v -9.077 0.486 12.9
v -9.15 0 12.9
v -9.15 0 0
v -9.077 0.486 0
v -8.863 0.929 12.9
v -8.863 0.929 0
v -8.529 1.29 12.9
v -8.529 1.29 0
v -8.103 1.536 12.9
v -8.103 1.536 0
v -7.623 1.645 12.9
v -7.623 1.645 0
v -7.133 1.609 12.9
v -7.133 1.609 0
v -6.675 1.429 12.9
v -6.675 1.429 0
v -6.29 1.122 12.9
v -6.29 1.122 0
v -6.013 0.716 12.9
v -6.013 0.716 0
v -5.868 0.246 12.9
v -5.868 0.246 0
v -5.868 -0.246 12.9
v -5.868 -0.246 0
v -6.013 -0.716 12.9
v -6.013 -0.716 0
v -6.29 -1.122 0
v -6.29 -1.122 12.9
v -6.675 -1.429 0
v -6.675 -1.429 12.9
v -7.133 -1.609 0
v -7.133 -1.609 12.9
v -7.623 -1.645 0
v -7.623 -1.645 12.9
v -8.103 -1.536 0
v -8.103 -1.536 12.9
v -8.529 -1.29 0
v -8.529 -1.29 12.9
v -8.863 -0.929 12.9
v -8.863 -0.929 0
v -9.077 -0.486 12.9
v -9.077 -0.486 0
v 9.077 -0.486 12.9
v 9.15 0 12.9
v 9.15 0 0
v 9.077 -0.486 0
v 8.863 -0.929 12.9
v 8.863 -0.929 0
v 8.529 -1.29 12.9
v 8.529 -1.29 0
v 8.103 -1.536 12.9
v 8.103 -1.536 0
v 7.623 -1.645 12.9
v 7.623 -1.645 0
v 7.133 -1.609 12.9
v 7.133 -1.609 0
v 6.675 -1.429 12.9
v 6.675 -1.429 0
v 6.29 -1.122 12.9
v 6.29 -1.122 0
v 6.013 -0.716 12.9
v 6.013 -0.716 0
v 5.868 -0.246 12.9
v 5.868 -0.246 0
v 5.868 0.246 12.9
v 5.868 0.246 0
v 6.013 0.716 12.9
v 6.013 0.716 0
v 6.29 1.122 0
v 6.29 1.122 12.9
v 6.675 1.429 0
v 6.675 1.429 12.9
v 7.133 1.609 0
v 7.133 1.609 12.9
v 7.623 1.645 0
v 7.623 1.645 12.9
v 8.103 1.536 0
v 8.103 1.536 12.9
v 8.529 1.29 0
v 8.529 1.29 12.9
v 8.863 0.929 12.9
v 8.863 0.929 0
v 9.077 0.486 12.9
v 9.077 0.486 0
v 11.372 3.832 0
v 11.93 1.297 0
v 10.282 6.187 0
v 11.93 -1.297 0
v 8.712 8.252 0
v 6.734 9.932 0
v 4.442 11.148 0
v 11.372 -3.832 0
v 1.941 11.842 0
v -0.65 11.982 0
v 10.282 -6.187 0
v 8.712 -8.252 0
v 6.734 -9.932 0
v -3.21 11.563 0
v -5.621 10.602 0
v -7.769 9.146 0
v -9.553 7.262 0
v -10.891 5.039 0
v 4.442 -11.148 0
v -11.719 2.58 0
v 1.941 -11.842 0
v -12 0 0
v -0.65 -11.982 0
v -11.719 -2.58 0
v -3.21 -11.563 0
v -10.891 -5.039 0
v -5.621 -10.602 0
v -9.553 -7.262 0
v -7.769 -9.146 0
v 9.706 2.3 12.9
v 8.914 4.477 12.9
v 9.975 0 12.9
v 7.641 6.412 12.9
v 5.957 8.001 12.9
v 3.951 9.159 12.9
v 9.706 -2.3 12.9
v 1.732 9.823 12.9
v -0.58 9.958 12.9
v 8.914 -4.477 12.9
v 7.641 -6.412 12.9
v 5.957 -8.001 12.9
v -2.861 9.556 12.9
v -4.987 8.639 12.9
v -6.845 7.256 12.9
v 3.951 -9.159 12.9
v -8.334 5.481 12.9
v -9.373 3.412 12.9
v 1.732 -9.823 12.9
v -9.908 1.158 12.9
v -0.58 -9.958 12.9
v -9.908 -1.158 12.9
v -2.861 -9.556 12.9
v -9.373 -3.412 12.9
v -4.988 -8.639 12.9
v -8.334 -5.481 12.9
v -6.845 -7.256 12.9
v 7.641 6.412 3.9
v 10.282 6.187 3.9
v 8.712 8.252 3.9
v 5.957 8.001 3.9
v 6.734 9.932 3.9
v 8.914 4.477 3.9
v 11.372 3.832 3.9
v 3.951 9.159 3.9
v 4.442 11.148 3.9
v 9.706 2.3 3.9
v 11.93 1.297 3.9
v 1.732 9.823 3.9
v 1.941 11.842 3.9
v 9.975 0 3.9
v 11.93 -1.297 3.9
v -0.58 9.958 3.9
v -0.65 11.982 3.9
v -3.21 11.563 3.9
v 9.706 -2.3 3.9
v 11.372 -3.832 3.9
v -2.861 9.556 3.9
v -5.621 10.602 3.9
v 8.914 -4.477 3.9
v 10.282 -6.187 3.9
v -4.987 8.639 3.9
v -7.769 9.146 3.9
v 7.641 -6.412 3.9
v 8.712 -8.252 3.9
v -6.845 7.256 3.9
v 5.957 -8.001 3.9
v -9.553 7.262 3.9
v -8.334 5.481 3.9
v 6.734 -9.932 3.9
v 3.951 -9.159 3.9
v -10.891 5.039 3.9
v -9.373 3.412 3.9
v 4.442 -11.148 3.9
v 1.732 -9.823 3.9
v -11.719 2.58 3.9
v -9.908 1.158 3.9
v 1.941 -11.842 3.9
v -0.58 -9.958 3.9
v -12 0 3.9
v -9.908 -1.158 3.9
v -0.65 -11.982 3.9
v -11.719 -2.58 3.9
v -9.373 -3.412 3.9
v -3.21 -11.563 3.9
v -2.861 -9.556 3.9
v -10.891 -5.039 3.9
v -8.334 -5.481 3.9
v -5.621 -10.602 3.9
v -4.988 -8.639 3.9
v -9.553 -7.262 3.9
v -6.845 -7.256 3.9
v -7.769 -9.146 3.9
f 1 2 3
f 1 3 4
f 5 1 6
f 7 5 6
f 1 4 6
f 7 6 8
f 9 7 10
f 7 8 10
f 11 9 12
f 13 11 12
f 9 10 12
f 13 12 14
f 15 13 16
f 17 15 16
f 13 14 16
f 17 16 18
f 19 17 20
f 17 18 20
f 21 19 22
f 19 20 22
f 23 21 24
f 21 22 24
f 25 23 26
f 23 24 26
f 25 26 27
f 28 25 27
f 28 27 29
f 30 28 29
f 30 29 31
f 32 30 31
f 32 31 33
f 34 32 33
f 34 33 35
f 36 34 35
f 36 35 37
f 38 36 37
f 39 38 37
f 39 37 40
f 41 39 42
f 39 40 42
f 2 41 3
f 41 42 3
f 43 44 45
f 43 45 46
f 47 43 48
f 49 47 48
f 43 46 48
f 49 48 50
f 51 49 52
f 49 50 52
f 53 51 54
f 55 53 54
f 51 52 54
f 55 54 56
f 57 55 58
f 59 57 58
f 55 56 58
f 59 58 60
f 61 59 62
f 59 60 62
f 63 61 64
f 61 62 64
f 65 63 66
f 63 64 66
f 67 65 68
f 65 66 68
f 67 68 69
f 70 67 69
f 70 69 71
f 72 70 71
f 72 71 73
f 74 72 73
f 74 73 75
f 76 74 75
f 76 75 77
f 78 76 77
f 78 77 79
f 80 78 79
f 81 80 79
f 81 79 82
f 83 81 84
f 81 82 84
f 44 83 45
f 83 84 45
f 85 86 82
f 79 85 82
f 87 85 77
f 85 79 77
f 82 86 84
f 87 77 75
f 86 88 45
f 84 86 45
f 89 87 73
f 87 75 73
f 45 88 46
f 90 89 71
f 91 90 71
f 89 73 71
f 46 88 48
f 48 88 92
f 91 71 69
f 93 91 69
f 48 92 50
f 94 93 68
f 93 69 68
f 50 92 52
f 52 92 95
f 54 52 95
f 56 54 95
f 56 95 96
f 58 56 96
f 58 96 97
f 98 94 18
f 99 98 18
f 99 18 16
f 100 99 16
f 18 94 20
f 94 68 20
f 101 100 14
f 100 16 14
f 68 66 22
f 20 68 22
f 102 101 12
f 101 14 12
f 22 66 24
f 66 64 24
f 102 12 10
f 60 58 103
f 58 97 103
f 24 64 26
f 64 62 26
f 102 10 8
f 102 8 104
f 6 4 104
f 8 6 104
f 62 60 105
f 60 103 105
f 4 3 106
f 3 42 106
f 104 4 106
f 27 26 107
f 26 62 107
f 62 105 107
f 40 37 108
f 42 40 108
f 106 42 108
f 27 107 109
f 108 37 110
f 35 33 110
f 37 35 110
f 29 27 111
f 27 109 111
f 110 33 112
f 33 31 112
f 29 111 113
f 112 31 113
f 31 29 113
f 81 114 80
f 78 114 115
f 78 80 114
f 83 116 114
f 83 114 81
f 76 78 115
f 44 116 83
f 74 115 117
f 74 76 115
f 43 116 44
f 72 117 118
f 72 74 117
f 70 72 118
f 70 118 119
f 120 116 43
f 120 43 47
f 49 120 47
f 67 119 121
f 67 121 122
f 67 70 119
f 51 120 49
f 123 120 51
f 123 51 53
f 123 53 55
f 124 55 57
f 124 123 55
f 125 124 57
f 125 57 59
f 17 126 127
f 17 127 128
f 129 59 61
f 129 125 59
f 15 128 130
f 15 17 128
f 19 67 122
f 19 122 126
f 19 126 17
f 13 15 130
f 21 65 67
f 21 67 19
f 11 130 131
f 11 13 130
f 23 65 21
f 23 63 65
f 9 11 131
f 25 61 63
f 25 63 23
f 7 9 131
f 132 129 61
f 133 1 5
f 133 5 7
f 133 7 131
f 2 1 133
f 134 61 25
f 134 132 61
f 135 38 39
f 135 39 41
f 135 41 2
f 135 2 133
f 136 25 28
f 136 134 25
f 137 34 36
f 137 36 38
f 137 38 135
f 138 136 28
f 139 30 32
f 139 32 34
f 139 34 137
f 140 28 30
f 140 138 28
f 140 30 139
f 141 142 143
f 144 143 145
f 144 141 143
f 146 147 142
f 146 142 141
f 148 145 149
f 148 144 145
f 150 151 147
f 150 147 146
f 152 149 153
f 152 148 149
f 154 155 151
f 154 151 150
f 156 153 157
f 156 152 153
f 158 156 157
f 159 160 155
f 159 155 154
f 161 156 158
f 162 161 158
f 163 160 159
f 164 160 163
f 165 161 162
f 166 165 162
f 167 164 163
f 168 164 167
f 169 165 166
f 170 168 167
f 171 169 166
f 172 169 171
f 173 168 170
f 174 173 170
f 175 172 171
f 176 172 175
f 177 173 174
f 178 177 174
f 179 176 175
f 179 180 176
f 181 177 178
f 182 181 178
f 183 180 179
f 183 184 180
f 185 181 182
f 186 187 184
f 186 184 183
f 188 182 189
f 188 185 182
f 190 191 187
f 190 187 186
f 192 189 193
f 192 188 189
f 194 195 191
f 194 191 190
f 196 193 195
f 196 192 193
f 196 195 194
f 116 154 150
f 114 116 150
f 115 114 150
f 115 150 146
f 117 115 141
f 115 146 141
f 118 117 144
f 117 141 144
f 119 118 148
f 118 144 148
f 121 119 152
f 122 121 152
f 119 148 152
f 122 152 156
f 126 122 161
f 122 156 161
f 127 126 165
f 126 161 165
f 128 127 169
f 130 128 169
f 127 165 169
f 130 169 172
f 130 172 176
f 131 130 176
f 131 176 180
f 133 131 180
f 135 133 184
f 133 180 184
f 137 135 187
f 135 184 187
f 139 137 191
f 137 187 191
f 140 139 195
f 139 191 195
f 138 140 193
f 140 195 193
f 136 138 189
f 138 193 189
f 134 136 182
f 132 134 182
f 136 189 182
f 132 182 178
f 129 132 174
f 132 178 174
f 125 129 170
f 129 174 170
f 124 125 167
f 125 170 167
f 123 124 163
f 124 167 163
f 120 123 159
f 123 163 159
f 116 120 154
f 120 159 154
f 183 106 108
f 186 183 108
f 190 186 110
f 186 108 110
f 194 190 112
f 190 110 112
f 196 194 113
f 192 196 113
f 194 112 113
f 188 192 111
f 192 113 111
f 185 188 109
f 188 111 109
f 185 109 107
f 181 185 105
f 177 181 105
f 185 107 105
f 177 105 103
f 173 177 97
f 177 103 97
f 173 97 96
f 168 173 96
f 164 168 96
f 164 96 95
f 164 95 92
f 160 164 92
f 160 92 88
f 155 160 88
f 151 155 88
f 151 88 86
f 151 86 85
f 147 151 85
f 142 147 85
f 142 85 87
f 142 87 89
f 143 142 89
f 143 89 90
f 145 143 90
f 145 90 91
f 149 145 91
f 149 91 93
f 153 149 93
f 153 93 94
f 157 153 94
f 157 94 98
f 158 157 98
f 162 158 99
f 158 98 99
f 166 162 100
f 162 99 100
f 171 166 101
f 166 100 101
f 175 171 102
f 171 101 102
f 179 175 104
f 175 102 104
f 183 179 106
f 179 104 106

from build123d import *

# Parameters (mm, degrees)
SKETCH_1_R          = 12
EXTRUDE_1_DEPTH     = 12.9
CUT_EXTRUDE_START   = -9
SKETCH_2_R          = 12
SKETCH_2_R_2        = 9.975
CUT_EXTRUDE_1_DEPTH = 9
SKETCH_3_R          = 1.65
CUT_EXTRUDE_2_DEPTH = 12.9


with BuildPart() as part:
    # ｽｹｯﾁ1 → ﾎﾞｽ - 押し出し1 (new body)
    with BuildSketch(Plane.XY):
        with Locations(Location((0, 0, 0), (0, 0, 180))):
            Circle(SKETCH_1_R)
    extrude(amount=EXTRUDE_1_DEPTH)

    # ｽｹｯﾁ2 → ｶｯﾄ - 押し出し1 (cut)
    with BuildSketch(Plane.XY.offset(12.9).offset(CUT_EXTRUDE_START)):
        with Locations(Location((0, 0, 0), (0, 0, 180))):
            Circle(SKETCH_2_R)
        Circle(SKETCH_2_R_2, mode=Mode.SUBTRACT)
    extrude(amount=CUT_EXTRUDE_1_DEPTH, mode=Mode.SUBTRACT)

    # ｽｹｯﾁ3 → ｶｯﾄ - 押し出し2 (cut)
    with BuildSketch(Plane(origin=(0, 0, 0), x_dir=(-1, 0, 0), z_dir=(0, 0, -1))):
        with Locations((7.5, 0)):
            Circle(SKETCH_3_R)
        with Locations(Location((-7.5, 0, 0), (0, 0, 180))):
            Circle(SKETCH_3_R)
    extrude(amount=-CUT_EXTRUDE_2_DEPTH, mode=Mode.SUBTRACT)


solid = part.part
